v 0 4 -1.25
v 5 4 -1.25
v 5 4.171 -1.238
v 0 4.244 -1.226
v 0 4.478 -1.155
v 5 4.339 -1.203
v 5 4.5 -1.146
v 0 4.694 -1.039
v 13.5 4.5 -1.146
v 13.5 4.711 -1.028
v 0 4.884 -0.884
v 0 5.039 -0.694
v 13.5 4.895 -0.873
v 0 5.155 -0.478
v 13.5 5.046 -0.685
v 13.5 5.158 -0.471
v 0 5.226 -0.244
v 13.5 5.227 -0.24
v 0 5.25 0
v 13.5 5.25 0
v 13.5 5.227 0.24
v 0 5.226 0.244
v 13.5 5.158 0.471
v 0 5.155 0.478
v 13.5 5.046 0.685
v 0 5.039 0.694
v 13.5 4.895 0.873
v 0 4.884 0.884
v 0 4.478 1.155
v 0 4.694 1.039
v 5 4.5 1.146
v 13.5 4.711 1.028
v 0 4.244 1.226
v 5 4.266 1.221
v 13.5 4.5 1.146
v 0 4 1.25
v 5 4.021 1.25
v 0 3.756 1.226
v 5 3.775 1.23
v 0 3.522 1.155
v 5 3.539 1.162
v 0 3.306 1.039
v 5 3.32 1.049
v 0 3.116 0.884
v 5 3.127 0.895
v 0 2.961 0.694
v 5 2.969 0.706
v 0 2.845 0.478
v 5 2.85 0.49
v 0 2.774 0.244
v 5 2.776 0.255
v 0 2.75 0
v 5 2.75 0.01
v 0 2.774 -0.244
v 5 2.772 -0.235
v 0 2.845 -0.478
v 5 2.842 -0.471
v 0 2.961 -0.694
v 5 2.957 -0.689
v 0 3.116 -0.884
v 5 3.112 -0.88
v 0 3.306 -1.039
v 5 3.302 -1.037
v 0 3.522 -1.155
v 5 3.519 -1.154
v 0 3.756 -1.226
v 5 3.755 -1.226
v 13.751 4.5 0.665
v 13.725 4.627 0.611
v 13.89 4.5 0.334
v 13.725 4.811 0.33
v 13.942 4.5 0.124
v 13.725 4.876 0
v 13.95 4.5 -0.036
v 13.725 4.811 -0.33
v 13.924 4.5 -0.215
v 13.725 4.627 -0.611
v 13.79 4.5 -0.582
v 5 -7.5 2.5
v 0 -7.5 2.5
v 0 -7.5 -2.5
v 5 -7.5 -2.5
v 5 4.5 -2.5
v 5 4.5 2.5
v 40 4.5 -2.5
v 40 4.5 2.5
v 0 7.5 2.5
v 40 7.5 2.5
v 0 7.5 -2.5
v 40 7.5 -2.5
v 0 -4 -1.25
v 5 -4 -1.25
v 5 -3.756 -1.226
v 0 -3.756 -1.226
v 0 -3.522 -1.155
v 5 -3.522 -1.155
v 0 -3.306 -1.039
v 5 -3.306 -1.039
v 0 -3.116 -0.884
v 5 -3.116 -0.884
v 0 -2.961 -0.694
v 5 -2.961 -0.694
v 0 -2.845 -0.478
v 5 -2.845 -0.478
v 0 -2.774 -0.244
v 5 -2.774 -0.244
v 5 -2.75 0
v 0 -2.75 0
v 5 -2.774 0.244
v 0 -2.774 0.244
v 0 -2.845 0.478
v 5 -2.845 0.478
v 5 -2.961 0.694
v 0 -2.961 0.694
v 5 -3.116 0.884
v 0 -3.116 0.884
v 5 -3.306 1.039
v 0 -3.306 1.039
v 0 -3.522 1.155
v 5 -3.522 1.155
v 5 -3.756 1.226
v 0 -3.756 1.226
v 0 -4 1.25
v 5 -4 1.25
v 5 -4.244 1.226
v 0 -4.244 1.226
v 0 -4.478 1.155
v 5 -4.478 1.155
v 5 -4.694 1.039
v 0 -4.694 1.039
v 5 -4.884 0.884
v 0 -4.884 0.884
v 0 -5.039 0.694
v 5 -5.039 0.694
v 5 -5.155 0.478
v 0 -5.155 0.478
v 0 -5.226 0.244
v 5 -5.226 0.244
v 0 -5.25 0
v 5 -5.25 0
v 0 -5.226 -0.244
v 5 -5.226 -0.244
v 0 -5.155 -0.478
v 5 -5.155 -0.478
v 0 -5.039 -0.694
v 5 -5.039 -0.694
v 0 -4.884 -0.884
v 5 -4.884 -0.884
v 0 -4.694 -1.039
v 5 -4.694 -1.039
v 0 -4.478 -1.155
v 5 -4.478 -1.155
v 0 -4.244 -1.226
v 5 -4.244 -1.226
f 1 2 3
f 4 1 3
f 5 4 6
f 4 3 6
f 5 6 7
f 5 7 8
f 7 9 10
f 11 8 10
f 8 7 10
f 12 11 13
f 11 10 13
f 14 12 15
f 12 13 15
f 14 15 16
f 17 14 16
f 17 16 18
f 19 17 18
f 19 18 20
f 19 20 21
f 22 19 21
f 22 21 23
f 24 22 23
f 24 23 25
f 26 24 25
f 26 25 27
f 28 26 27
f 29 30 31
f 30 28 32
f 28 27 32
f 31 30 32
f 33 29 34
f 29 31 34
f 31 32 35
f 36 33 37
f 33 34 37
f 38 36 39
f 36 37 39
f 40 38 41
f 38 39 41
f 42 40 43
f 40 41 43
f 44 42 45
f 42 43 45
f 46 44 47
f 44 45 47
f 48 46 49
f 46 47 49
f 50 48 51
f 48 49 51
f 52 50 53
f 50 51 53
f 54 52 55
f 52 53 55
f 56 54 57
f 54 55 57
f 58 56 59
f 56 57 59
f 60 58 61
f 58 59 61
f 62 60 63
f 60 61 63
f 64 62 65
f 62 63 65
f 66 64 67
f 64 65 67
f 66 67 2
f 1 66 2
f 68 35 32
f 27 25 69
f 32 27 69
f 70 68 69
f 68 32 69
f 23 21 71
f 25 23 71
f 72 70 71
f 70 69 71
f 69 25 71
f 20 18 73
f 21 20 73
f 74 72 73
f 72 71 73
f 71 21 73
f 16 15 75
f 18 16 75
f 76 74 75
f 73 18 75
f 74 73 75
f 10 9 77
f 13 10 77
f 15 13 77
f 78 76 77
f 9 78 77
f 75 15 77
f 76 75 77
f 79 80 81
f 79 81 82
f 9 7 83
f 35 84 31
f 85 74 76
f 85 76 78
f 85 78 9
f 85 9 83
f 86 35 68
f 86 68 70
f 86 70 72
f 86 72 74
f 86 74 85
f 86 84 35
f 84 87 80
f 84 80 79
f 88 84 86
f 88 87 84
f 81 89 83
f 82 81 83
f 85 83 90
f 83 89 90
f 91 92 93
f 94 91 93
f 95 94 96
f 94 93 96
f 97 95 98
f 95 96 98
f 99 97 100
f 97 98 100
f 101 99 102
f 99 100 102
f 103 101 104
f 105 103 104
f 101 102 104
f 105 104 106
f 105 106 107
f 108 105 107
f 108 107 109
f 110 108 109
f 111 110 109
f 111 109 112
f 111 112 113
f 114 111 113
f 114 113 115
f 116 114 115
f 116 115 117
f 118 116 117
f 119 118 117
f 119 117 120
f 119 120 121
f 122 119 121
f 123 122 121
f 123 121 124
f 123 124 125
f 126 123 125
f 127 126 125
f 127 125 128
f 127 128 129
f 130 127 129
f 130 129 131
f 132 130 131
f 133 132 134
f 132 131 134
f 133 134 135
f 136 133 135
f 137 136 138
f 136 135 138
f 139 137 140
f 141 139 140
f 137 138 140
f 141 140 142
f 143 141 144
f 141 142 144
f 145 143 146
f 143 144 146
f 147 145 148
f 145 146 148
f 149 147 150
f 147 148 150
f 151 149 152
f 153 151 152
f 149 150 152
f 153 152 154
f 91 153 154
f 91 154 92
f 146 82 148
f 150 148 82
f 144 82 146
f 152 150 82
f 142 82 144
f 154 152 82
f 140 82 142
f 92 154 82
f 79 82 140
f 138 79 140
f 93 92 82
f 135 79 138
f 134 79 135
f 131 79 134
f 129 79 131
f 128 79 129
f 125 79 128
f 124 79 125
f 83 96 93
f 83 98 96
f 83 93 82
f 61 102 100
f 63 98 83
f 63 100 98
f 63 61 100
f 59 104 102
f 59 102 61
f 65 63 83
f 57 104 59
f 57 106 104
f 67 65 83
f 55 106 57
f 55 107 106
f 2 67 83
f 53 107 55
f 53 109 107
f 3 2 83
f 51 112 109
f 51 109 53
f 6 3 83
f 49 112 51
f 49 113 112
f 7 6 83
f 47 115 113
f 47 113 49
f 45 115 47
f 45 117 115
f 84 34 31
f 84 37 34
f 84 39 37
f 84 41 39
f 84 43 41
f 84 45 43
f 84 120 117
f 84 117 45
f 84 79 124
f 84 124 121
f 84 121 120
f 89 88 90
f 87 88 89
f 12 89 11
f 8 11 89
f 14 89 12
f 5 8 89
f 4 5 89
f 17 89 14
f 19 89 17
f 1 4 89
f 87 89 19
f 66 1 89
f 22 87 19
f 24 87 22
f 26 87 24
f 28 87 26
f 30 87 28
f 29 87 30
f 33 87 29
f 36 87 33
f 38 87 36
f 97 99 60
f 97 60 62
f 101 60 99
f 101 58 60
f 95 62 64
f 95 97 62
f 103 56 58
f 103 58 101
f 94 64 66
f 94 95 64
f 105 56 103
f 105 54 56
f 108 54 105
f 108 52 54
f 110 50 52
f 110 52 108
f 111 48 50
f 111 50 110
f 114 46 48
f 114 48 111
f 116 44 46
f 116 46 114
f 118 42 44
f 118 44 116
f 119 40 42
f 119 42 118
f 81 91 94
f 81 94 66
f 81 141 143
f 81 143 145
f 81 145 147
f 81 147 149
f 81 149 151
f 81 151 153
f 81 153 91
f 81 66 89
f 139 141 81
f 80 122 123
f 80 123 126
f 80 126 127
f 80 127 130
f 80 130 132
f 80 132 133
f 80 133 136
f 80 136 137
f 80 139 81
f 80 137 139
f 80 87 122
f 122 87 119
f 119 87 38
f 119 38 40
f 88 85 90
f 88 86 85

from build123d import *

# Parameters (mm, degrees)
BOSS_EXTRUDE1_DEPTH   = 2.5
M3_TAPPED_HOLE1_D     = 2.5
M3_TAPPED_HOLE1_DEPTH = 13.5
M3_TAPPED_HOLE1_TIP   = 0.751075774


with BuildPart() as part:
    # Sketch1 → Boss-Extrude1 (new, symmetric)
    with BuildSketch(Plane.XY):
        Polygon((40, 7.5), (0, 7.5), (0, -7.5), (5, -7.5), (5, 4.5), (40, 4.5), align=None)
    extrude(amount=BOSS_EXTRUDE1_DEPTH, both=True)

    # M3 Tapped Hole1
    with Locations(Plane.ZY):
        with Locations((0, -4), (0, 4)):
            Hole(M3_TAPPED_HOLE1_D / 2, depth=M3_TAPPED_HOLE1_DEPTH)
            with Locations((0, 0, -(M3_TAPPED_HOLE1_DEPTH + M3_TAPPED_HOLE1_TIP / 2))):  # 118° drill point
                Cone(0, M3_TAPPED_HOLE1_D / 2, M3_TAPPED_HOLE1_TIP, mode=Mode.SUBTRACT)


solid = part.part
